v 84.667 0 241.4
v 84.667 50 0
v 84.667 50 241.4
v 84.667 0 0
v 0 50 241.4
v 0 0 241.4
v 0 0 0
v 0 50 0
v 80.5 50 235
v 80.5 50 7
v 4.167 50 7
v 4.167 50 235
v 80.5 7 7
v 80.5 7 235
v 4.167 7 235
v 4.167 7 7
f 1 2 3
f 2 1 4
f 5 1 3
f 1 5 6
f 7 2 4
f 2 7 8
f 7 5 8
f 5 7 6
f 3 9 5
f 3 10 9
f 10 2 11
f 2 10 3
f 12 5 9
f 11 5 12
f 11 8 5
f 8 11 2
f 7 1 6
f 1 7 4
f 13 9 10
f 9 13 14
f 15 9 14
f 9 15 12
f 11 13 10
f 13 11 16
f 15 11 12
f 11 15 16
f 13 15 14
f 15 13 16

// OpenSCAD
//Customizable Silverware Drawer Organizer -3 side by side for drawer wider then 6 inches,
//Each Holder Printerd Seperately and placed next to each other in drawer
//Knife, Spoon, Fork
//Simple Cube design
//Thickness of design is not adjustable
//Designed to to sit side by side with edge of drawer or another holder


//Enter Width of Drawer in mm
w=254;

//Depth of drawer (Measure side down) in mm 
d=63;

//Enter Length (mm) of Longest Utensile 
L=216;


module uholder(){
        difference(){
        cube([(w/3),(d-13),(L+25.4)],false);
            translate([(25/3)/2,7,7])cube([((w-25)/3),(d-6),(L+12)],false);
    }
}
uholder();
